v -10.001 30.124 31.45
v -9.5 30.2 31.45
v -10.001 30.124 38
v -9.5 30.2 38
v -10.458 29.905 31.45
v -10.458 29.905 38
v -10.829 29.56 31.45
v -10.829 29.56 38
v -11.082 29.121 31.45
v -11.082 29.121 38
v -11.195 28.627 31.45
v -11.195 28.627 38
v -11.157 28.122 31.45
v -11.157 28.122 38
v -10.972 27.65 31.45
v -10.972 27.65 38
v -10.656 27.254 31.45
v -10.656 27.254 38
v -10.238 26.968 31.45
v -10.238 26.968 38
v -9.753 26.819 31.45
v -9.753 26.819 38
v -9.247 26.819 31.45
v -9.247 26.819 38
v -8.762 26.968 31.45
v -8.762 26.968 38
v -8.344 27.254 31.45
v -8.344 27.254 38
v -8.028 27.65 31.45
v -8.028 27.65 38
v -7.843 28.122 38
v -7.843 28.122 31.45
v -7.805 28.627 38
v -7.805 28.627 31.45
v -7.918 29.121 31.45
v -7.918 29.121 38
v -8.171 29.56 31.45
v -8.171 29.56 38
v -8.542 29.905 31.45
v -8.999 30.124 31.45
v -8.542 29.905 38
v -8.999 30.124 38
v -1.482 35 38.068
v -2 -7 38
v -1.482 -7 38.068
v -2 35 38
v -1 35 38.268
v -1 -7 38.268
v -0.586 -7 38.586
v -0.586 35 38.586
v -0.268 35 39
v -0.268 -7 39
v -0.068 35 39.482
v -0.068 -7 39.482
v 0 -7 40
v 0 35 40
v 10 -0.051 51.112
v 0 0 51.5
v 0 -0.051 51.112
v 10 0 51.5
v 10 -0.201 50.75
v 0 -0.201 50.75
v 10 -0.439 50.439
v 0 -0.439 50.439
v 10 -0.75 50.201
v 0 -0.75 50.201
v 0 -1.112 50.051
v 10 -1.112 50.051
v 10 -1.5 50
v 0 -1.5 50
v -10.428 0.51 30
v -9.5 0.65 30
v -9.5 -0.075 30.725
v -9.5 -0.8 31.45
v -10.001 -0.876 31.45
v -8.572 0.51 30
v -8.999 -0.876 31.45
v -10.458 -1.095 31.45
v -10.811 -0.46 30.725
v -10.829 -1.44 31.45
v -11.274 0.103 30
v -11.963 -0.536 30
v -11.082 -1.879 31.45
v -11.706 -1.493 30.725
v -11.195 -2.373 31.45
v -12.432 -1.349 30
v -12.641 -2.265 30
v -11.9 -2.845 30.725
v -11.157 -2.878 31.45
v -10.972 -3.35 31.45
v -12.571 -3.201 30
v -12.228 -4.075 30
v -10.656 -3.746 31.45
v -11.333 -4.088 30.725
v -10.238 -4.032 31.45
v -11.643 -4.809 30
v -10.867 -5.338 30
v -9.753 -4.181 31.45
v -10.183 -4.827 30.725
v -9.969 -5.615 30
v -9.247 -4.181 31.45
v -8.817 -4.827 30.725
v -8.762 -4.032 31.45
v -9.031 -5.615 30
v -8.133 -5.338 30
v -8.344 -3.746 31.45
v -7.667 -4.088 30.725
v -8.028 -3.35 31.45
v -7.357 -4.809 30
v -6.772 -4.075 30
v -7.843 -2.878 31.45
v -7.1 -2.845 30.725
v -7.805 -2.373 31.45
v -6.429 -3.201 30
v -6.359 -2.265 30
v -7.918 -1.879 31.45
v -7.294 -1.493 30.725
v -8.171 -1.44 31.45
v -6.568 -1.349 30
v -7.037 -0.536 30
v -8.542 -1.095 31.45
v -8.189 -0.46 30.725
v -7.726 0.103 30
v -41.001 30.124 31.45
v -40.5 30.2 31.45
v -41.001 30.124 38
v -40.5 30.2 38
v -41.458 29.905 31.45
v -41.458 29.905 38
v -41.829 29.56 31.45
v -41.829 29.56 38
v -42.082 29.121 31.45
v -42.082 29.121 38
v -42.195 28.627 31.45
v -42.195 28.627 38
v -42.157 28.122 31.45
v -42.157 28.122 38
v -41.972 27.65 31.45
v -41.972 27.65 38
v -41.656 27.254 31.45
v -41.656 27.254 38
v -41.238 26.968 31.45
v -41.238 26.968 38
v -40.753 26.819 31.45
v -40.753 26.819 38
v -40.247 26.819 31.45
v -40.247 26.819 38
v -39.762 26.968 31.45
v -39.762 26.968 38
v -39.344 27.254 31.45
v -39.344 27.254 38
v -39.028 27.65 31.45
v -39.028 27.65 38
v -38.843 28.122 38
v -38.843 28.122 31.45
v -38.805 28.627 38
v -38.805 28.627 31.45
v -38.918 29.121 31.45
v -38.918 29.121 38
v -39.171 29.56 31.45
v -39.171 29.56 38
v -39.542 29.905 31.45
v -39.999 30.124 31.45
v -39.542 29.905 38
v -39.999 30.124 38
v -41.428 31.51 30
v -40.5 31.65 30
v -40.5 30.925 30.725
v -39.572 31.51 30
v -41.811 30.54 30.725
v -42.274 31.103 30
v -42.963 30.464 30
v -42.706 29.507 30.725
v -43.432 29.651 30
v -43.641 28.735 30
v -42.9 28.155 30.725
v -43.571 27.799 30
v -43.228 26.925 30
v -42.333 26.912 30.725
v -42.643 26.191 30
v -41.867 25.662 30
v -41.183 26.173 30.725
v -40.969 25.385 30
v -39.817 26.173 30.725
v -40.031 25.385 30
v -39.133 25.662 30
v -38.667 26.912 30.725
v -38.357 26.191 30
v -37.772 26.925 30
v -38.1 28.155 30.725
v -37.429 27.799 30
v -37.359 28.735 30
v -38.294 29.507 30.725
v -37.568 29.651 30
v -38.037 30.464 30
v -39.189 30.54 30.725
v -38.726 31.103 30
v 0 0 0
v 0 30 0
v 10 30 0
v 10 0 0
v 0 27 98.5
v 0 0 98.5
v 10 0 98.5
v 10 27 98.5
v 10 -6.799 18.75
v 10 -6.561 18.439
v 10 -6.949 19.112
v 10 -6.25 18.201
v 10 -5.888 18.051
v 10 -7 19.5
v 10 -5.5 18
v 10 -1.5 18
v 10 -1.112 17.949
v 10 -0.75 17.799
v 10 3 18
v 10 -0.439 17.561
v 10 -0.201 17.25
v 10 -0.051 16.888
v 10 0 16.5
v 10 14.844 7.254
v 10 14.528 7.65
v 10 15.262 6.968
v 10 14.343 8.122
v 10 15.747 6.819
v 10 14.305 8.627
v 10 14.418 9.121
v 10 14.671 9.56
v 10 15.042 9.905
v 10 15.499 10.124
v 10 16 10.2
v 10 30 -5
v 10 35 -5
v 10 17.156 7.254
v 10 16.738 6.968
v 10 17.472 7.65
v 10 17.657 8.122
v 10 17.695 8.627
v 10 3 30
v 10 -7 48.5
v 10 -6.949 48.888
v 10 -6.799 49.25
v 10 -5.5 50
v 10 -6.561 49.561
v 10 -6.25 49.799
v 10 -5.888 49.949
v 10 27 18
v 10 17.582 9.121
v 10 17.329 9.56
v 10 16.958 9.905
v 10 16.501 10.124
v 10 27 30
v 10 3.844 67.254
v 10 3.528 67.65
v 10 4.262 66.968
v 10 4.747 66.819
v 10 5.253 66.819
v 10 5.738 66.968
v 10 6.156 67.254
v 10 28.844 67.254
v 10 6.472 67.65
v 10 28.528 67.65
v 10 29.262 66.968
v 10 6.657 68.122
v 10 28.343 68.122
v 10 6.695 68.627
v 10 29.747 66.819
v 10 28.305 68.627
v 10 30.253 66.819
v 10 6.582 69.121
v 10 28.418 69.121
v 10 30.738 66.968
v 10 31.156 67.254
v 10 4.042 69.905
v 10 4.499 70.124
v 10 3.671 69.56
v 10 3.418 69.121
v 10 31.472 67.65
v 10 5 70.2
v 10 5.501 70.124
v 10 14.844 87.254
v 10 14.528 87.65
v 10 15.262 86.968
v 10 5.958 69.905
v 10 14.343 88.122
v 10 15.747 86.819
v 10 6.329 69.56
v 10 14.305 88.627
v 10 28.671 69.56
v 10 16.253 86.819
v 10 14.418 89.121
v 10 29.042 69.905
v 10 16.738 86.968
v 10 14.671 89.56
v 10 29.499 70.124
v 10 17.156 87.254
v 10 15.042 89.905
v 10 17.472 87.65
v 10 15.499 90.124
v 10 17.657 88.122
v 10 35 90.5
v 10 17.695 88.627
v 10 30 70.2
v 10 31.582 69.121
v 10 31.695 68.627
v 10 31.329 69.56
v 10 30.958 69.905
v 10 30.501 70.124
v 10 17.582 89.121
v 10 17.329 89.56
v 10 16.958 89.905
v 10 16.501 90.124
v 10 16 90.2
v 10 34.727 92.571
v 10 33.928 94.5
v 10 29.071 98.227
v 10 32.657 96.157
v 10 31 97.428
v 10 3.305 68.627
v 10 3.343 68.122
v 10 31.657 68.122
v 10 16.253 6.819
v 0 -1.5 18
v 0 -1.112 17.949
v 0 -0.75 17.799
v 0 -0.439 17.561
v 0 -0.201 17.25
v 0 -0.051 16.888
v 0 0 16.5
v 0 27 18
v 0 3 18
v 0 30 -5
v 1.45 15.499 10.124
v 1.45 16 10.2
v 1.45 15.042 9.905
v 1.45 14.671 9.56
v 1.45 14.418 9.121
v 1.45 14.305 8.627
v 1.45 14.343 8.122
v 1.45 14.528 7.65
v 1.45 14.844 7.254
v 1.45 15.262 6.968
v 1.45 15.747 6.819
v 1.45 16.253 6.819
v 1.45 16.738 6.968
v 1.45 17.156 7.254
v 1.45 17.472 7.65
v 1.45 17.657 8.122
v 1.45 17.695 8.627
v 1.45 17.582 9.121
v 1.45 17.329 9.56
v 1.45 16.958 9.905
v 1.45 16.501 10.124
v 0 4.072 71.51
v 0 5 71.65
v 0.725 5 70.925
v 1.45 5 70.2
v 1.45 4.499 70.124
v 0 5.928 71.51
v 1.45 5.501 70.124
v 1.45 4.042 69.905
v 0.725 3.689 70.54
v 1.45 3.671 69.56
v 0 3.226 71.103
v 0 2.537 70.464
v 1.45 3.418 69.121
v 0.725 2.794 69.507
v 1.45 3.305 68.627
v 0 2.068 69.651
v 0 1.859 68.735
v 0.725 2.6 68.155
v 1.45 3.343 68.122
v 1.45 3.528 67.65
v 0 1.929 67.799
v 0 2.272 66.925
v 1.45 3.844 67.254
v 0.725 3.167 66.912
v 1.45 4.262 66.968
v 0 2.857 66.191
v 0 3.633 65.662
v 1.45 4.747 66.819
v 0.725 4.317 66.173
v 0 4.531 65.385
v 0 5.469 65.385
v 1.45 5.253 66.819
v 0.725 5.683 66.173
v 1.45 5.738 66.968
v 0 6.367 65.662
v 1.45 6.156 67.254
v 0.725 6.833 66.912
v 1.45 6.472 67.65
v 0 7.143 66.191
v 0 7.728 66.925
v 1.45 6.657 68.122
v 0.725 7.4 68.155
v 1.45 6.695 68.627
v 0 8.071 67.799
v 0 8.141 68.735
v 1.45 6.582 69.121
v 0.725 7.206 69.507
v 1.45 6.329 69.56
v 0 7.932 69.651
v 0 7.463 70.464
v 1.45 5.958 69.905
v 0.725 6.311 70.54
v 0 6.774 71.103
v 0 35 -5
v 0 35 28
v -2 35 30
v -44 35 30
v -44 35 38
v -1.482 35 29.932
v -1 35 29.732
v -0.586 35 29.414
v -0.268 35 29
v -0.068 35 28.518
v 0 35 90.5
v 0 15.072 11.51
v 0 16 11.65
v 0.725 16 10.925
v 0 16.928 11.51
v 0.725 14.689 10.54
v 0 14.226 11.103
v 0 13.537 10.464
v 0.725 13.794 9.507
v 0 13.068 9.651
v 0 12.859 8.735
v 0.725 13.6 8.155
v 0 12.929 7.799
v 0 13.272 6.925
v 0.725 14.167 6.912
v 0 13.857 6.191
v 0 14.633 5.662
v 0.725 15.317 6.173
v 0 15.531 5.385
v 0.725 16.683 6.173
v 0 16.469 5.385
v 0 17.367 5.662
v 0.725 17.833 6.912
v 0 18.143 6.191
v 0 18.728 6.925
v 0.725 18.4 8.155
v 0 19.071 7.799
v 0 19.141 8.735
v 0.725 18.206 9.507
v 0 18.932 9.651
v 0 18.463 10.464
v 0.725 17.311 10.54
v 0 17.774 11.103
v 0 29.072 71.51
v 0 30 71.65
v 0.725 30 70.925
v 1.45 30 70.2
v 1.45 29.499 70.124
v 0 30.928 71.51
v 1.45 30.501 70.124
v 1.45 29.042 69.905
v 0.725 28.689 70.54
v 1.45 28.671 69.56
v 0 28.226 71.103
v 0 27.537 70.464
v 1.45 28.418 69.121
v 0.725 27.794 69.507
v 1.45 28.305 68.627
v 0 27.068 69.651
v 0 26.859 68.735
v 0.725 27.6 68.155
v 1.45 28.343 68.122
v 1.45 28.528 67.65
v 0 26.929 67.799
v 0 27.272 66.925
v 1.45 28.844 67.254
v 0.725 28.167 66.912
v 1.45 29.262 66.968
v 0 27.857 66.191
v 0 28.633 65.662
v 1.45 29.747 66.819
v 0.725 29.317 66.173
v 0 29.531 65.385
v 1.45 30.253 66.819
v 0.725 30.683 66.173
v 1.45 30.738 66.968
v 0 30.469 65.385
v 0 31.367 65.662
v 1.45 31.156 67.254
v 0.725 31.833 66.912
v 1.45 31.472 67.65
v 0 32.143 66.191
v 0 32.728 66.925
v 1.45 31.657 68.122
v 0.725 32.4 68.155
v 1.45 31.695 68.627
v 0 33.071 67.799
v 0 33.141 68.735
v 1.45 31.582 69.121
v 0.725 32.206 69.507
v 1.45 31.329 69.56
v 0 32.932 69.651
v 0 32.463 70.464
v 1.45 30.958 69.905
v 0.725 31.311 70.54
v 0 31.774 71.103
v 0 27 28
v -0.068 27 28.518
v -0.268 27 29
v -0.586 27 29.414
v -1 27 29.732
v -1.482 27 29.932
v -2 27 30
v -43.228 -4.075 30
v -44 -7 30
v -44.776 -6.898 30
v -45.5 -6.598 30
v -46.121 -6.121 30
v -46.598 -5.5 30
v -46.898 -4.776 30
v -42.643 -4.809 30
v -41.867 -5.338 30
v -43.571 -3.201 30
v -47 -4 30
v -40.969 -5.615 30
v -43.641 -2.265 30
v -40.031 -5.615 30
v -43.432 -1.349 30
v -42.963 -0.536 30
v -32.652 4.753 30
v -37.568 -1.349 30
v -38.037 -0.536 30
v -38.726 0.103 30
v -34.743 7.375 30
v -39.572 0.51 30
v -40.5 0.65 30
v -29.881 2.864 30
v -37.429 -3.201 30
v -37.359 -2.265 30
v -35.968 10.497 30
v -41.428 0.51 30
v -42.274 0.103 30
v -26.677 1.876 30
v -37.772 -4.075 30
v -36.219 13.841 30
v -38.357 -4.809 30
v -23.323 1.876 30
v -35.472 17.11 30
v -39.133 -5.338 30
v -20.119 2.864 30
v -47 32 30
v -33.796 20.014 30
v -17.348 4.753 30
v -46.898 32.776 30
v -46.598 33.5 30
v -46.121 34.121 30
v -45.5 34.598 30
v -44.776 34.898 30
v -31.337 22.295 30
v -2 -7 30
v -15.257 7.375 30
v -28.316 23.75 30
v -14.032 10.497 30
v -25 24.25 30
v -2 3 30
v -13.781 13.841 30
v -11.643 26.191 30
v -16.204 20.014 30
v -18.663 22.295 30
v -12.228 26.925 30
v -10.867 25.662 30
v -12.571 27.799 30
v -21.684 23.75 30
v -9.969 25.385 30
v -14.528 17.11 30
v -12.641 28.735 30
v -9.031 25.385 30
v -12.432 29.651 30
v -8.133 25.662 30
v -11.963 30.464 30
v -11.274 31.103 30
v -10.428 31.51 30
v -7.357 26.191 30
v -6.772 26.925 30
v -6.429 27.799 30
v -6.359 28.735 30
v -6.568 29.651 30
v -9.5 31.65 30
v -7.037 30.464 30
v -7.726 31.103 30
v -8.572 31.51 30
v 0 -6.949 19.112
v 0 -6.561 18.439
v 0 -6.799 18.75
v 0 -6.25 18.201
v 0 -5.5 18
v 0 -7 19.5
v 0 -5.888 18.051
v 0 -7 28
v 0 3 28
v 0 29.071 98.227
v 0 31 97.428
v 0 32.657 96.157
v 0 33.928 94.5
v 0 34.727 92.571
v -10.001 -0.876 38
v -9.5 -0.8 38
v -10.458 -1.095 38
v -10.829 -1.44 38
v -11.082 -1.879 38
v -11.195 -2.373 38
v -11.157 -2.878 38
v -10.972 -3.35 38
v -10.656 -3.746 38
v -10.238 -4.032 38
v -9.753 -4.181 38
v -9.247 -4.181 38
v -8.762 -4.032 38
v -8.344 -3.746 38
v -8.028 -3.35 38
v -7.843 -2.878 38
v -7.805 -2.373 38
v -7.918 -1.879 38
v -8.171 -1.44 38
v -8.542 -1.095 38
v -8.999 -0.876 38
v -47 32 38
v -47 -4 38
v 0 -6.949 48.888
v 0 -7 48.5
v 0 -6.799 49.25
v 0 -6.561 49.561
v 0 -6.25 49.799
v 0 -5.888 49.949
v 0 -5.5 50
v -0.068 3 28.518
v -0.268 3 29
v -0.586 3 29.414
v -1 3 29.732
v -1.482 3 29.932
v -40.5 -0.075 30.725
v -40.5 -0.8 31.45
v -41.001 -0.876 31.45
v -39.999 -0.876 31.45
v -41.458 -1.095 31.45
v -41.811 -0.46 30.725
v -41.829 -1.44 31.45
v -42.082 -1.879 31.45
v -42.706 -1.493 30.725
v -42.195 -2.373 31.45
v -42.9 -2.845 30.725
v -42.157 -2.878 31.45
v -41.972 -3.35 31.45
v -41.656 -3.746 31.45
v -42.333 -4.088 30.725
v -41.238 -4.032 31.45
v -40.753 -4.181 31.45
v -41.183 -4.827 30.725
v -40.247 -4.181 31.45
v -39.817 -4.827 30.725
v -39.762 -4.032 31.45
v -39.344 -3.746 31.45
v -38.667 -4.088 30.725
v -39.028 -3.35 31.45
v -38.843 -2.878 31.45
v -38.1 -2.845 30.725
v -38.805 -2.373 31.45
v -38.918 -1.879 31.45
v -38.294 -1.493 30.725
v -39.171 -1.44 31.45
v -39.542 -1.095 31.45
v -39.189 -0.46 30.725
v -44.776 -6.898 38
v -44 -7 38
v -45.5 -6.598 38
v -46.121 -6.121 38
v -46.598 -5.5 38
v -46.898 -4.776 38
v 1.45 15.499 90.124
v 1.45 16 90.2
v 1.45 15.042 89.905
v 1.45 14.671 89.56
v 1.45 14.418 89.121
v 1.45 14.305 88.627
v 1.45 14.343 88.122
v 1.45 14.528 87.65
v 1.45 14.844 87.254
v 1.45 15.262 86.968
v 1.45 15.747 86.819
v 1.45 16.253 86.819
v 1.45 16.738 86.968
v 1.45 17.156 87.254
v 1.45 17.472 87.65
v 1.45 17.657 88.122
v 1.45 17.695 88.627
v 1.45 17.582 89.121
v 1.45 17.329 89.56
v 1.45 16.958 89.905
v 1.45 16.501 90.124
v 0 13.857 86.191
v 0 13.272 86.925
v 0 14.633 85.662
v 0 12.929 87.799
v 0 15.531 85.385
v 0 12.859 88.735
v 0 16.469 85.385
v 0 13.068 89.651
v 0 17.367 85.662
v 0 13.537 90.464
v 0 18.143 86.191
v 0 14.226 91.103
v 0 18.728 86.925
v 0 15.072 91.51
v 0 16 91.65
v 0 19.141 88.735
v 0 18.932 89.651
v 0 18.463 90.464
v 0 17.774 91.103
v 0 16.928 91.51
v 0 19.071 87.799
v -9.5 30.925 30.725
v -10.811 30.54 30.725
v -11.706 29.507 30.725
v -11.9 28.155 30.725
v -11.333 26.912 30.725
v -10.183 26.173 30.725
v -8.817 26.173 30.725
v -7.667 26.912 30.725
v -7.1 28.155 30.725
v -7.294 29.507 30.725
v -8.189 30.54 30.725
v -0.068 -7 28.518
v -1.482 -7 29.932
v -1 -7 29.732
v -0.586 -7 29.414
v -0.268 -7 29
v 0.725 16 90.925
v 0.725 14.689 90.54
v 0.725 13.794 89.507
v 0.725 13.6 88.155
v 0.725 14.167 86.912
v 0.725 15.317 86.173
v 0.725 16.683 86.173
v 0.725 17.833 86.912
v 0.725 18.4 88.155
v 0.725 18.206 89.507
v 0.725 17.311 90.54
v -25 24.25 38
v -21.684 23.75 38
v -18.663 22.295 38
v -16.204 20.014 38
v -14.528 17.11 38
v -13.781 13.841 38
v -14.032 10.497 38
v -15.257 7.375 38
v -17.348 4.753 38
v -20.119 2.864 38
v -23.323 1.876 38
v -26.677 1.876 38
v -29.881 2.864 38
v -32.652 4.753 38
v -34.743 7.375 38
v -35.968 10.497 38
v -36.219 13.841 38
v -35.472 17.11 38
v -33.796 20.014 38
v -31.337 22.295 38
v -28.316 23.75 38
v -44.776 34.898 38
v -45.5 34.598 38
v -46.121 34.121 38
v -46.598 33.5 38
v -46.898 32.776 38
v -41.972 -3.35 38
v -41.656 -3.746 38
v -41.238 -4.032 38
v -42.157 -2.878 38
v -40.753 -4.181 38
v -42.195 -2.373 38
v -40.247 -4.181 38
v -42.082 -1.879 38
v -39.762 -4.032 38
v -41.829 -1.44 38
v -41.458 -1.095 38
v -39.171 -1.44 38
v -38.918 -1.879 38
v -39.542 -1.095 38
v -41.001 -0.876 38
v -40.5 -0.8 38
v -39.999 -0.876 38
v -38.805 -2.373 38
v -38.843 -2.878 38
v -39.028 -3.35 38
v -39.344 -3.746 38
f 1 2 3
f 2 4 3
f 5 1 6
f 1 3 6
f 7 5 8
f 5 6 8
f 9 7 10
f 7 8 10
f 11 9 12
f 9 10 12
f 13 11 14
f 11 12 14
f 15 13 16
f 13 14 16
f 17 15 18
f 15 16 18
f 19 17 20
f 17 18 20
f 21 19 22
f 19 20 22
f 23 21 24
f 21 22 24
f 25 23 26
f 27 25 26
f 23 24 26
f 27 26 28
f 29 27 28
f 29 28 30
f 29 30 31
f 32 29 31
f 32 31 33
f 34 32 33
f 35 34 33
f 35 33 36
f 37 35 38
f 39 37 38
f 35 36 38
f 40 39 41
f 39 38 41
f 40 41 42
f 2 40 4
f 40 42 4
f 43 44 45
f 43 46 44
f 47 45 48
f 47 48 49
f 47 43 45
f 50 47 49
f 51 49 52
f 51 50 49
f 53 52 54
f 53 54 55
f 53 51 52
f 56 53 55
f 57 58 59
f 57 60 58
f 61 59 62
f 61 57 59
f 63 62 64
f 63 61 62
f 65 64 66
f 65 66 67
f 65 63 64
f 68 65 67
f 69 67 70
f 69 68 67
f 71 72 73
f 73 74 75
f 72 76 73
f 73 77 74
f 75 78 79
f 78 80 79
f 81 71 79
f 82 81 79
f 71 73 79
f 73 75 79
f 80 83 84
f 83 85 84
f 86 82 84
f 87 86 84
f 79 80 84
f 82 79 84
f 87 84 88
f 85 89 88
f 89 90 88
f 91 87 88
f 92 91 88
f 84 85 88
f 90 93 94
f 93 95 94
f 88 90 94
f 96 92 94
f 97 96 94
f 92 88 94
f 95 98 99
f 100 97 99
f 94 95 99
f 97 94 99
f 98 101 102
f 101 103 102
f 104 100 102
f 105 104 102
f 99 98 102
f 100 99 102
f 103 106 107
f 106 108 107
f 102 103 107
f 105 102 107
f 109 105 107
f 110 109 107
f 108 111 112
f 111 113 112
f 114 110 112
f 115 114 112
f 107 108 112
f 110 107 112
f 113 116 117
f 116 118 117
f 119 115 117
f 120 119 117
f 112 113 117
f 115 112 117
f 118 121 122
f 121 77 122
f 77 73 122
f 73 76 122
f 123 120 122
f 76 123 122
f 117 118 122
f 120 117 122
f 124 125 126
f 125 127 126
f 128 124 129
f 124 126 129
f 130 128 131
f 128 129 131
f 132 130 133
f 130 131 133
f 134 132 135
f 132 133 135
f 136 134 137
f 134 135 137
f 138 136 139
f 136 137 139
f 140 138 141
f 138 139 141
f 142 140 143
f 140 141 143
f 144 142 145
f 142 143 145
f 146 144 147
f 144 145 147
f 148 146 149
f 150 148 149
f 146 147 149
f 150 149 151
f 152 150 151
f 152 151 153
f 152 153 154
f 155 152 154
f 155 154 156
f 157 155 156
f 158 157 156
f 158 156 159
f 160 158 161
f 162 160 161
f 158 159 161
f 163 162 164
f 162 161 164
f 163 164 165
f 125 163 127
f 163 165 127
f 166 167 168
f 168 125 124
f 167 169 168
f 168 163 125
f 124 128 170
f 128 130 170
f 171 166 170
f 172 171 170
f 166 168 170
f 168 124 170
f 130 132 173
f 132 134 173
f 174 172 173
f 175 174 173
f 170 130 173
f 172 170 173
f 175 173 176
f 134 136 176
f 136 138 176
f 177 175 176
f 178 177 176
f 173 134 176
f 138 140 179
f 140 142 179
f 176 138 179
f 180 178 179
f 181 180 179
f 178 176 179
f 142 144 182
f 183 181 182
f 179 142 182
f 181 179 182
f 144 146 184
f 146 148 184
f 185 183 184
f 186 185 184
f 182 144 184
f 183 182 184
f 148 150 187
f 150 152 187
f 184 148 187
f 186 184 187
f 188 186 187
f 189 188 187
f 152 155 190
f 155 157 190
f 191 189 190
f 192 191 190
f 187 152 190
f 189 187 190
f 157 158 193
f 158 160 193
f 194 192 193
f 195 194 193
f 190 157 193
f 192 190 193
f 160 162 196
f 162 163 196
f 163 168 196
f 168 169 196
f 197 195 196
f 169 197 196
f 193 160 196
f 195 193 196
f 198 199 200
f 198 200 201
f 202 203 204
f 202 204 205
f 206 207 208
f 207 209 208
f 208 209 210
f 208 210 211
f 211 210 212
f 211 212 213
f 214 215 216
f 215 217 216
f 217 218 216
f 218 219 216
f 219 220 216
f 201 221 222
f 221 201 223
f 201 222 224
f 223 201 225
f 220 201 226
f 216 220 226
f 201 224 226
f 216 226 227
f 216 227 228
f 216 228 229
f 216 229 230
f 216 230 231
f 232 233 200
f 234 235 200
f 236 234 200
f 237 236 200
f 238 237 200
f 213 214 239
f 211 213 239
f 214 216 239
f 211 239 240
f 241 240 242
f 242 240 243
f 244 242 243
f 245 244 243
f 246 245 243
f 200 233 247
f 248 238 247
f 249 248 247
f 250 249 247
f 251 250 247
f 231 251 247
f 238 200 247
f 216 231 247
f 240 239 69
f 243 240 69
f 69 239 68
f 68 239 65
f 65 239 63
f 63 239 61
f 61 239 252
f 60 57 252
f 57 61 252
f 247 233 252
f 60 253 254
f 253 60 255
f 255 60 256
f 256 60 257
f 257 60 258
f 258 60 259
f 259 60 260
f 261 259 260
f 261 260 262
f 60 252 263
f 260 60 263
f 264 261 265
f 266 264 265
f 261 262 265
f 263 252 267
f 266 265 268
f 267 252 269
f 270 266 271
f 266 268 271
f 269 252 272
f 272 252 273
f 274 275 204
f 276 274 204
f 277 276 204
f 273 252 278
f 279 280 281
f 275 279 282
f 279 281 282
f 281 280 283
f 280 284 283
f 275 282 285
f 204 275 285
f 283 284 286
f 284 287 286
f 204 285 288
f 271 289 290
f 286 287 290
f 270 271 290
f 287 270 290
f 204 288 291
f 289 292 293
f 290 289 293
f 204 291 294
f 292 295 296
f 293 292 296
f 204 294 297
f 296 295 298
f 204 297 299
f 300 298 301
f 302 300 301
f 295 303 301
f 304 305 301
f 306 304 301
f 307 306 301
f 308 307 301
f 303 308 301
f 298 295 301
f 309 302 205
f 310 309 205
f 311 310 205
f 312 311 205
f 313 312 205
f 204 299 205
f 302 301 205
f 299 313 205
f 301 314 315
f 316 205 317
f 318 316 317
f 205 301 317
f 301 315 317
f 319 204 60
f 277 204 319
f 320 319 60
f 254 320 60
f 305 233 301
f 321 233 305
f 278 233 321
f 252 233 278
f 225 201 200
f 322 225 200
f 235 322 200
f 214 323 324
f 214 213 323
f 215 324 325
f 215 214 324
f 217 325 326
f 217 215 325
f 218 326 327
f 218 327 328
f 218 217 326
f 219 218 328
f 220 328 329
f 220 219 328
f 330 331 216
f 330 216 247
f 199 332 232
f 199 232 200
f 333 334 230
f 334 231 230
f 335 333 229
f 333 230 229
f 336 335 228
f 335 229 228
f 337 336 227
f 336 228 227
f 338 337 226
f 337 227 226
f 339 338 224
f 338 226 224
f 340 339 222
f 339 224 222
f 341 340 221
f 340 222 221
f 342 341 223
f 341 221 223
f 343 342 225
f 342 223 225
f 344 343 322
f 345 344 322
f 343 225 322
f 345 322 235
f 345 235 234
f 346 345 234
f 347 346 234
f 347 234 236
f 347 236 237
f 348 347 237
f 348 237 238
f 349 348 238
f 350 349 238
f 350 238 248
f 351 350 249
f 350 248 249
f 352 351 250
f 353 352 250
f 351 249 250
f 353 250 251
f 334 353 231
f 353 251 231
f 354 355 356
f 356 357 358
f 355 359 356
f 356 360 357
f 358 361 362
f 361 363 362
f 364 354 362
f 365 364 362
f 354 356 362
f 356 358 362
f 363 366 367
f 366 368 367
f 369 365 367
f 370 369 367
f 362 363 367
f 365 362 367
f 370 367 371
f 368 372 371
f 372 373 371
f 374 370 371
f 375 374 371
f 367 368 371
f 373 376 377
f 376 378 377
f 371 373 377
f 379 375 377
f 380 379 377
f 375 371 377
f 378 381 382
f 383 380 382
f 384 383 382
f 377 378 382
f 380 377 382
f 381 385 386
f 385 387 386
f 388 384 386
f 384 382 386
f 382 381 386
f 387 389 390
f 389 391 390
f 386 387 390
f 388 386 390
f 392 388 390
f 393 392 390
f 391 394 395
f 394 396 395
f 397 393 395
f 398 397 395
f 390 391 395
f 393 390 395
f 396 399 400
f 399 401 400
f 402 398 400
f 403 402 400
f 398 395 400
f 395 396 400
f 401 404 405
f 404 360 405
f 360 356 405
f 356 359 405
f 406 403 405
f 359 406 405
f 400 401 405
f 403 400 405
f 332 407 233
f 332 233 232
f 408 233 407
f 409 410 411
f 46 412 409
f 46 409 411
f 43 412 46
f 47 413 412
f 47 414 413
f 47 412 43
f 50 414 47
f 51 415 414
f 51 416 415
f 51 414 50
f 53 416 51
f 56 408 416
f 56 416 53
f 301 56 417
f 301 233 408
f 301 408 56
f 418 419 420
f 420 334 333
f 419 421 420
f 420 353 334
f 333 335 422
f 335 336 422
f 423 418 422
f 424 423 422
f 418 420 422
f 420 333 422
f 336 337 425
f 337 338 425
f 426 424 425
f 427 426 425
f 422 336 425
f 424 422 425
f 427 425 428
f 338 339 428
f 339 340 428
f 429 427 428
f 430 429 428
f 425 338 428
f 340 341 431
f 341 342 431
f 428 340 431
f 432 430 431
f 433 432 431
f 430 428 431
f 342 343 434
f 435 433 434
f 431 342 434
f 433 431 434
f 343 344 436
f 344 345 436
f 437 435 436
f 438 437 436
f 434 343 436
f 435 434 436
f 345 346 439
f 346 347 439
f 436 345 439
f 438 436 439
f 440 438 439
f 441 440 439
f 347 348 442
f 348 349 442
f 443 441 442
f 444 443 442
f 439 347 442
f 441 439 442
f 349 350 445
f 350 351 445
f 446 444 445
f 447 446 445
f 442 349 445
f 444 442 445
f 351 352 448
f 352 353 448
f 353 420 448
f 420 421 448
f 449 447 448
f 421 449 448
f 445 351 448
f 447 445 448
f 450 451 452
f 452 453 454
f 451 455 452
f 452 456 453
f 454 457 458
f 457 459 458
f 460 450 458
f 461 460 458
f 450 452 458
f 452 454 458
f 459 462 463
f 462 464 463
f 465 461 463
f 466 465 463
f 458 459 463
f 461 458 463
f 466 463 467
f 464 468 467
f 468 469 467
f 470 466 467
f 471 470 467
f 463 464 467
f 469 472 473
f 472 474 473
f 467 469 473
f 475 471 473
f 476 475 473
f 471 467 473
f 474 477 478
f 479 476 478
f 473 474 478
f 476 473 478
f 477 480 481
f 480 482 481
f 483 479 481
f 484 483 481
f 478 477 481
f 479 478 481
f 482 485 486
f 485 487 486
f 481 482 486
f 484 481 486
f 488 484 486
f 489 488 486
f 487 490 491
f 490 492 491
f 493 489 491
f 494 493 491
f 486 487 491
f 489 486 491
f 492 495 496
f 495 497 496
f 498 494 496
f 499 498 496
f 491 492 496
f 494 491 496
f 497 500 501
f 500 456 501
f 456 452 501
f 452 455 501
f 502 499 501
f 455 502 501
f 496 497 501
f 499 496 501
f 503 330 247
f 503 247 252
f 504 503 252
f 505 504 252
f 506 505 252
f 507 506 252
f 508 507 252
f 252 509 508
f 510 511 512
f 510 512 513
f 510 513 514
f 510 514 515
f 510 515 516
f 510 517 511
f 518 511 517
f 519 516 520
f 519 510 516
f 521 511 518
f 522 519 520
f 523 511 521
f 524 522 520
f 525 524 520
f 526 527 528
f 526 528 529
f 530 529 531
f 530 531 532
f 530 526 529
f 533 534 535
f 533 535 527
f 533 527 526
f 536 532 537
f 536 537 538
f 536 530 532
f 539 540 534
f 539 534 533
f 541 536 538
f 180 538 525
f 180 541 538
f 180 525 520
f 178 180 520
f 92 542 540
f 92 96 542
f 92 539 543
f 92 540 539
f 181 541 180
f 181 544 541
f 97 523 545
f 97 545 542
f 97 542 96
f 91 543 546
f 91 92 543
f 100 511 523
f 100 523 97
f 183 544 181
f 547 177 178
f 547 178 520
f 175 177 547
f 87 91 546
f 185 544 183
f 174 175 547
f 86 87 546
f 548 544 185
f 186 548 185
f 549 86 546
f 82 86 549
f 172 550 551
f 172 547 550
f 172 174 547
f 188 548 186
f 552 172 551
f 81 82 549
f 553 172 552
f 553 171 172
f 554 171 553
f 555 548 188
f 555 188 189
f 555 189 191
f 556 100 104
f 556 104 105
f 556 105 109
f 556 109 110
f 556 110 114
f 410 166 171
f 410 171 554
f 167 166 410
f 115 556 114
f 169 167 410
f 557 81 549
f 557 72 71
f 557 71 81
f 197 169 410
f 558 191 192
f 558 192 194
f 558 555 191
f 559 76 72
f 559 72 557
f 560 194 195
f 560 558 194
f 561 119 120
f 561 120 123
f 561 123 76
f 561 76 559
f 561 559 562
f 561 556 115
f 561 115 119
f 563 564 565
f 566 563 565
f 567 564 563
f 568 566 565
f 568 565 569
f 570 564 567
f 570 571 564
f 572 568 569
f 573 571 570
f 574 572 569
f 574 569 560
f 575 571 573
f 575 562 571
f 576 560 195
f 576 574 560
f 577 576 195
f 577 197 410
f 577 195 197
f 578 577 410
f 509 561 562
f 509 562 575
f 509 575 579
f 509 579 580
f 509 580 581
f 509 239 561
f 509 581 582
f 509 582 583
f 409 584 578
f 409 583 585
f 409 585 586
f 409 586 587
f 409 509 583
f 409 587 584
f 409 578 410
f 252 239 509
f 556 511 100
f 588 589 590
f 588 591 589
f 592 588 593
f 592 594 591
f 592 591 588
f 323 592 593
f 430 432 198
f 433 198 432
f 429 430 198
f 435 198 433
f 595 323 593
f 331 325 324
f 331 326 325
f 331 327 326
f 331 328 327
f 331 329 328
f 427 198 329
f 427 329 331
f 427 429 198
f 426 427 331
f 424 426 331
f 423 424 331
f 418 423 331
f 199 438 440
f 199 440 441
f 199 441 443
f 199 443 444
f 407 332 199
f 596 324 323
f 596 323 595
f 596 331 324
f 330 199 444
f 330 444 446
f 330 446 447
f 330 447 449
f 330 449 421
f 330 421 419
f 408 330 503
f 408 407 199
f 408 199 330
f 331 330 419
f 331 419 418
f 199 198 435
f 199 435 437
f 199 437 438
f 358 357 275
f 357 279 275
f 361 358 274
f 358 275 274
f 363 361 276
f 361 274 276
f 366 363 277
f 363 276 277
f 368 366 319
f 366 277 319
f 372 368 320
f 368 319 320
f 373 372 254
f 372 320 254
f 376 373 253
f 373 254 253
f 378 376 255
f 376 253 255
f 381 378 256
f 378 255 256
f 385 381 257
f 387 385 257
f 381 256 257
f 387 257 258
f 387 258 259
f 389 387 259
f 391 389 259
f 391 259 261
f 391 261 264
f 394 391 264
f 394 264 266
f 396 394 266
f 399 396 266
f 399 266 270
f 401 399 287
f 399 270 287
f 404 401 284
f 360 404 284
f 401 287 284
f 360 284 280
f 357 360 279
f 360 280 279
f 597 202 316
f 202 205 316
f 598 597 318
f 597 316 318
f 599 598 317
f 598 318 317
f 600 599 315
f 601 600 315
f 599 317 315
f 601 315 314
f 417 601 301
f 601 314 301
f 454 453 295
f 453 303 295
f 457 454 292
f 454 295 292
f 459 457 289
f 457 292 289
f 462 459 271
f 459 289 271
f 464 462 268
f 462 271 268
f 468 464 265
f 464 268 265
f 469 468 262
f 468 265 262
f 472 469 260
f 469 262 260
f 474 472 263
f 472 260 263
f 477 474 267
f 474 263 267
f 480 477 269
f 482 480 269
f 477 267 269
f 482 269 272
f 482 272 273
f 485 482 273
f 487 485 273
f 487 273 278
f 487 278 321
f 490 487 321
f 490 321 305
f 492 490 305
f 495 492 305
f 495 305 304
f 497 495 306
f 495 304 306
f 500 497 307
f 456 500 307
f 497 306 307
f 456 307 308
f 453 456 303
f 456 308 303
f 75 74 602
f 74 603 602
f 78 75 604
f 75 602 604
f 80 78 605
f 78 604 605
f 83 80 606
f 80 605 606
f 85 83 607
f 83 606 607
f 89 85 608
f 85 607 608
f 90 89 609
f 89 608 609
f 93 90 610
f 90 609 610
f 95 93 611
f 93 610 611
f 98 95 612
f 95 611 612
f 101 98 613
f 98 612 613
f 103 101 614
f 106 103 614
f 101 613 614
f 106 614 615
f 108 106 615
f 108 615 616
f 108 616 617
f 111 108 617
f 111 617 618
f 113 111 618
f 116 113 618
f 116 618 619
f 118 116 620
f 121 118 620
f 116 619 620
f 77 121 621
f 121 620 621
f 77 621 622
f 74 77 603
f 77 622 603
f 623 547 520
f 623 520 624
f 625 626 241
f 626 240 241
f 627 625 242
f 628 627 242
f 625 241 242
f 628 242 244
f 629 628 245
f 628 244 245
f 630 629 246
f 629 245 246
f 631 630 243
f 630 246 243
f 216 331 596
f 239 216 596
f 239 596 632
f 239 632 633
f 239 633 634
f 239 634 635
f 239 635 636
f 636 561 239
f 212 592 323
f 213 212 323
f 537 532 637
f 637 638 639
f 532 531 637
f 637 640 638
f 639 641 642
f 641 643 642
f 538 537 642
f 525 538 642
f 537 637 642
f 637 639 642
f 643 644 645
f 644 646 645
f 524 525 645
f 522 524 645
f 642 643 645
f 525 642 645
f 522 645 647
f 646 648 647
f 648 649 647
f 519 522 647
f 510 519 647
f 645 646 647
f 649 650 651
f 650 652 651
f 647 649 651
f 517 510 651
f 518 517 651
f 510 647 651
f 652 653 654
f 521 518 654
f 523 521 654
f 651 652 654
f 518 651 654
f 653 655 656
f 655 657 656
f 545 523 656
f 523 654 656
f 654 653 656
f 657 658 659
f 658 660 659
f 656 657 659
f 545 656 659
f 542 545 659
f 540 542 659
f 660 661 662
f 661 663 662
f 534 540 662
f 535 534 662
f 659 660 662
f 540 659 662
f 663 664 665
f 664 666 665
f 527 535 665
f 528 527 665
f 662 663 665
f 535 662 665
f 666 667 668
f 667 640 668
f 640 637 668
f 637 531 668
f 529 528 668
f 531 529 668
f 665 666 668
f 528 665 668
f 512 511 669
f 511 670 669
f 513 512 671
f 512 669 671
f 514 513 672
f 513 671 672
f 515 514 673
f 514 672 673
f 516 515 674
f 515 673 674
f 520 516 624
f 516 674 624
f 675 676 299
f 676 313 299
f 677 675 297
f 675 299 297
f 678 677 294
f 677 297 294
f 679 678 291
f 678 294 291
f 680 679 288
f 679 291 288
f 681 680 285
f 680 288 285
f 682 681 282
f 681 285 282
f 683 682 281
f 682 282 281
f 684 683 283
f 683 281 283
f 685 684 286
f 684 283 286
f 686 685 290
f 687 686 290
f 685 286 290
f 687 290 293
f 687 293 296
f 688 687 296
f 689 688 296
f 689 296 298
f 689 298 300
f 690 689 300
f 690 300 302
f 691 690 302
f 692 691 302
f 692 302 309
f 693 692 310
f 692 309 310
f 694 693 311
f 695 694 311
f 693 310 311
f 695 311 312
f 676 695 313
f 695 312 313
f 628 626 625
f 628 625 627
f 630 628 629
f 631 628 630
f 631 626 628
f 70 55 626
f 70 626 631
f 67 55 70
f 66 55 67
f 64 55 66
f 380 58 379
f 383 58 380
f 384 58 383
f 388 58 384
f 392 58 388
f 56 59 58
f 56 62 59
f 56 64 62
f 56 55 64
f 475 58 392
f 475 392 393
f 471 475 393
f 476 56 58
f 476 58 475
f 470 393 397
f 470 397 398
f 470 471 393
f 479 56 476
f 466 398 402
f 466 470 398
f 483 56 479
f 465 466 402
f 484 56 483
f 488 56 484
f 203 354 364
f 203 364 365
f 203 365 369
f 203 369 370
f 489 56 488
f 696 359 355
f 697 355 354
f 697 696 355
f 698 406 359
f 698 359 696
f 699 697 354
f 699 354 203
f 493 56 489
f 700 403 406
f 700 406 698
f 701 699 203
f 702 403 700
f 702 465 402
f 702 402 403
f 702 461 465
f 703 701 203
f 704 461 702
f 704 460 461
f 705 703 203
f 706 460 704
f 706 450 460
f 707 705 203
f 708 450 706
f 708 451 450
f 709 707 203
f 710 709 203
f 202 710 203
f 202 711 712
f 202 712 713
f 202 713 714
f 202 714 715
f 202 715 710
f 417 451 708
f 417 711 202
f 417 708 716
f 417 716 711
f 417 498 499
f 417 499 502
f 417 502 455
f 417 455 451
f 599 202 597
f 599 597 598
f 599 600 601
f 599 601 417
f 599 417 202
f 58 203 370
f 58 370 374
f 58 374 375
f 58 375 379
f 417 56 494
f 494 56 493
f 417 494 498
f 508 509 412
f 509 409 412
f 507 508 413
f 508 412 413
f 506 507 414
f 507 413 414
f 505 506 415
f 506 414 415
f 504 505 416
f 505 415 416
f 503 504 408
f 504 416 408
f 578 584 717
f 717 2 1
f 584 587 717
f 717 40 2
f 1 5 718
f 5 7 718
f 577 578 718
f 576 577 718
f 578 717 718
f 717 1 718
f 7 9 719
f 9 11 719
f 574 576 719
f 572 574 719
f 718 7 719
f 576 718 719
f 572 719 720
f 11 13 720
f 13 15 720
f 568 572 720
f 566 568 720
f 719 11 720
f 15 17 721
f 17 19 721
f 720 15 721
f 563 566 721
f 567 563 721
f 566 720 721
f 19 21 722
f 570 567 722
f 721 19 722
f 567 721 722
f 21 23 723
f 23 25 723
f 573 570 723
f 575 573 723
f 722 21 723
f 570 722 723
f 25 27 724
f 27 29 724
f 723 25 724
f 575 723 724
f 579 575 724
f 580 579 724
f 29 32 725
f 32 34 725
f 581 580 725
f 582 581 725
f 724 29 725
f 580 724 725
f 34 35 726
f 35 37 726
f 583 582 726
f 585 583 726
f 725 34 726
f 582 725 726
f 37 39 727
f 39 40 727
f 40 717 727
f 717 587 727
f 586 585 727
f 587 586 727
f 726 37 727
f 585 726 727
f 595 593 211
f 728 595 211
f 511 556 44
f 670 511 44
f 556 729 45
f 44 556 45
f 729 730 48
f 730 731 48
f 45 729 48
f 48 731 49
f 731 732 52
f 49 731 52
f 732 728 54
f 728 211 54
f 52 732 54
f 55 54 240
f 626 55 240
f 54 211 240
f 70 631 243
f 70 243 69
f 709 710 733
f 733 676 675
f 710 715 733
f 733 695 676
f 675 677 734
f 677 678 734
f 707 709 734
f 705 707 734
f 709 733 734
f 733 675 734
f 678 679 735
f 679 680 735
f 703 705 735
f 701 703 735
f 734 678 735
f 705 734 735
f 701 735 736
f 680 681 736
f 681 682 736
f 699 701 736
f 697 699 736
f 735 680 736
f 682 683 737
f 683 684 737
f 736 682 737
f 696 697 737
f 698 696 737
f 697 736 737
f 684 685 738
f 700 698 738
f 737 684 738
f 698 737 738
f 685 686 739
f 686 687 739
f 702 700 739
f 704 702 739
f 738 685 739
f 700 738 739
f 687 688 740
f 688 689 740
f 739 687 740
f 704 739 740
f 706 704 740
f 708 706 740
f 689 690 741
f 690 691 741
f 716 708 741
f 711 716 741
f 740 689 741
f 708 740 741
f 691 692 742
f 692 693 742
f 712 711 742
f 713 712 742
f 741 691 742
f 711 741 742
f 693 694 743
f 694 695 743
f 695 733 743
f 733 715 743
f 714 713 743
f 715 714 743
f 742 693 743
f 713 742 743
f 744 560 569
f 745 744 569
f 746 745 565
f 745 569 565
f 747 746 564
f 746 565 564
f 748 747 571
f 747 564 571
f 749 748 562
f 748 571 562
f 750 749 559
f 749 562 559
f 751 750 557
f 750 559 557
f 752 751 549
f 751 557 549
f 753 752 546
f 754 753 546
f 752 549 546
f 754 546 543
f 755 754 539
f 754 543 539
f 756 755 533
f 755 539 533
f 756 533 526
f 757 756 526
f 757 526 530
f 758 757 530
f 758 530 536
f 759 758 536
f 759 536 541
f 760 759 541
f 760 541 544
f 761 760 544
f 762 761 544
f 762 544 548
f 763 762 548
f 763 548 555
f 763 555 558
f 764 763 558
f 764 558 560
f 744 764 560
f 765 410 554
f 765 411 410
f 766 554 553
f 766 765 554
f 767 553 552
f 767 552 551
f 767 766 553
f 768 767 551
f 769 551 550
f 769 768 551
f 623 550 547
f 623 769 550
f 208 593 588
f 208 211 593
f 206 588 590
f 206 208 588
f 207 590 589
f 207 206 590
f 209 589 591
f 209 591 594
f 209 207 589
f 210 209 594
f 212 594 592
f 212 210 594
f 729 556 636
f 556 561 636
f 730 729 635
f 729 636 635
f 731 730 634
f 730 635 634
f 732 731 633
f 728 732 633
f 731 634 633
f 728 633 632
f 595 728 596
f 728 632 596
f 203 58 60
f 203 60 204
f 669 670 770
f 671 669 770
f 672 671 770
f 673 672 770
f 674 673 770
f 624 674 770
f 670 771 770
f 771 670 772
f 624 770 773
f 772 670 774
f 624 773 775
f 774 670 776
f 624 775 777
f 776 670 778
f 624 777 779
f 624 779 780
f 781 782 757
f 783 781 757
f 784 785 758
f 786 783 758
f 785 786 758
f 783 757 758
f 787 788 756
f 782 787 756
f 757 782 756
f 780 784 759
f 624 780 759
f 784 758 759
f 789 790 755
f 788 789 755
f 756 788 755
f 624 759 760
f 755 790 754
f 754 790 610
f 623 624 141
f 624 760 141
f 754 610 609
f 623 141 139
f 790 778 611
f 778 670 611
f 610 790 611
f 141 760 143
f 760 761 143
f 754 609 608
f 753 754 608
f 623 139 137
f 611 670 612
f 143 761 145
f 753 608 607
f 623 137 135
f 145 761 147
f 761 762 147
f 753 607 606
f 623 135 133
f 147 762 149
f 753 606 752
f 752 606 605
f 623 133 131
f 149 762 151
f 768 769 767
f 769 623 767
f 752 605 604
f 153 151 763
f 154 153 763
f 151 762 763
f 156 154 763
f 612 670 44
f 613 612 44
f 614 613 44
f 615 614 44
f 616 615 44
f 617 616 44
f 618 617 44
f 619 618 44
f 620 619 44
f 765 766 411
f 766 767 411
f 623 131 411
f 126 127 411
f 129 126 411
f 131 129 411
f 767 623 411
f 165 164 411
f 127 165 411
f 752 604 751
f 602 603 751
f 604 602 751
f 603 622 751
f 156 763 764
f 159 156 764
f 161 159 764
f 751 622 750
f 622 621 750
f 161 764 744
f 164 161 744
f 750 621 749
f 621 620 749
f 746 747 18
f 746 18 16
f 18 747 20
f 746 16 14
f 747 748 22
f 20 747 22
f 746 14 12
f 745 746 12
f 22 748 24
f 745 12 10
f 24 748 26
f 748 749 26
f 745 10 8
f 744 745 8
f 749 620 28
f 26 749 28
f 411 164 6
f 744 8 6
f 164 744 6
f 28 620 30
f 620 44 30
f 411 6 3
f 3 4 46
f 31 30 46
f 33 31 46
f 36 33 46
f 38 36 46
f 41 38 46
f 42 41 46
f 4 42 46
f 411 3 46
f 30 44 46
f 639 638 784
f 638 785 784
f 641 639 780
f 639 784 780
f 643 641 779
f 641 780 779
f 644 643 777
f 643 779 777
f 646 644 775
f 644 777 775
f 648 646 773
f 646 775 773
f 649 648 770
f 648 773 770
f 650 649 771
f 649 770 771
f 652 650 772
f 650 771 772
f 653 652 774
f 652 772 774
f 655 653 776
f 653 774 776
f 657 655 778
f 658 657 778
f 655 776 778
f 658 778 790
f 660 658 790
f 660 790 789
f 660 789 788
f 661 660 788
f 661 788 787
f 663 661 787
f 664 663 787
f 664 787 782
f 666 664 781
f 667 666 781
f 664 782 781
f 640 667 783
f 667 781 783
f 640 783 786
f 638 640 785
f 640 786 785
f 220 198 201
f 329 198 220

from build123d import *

# Parameters (mm, degrees)
BOSS_EXTRUDE1_DEPTH                                 = 10
CSK_FOR_M3_COUNTERSUNK_FLAT_HEAD_SCREW1_D           = 3.4
CSK_FOR_M3_COUNTERSUNK_FLAT_HEAD_SCREW1_CSINK_D     = 6.3
CSK_FOR_M3_COUNTERSUNK_FLAT_HEAD_SCREW1_CSINK_ANGLE = 90
SKETCH4_W                                           = 12
SKETCH4_H                                           = 24
CUT_EXTRUDE1_DEPTH                                  = 10
SKETCH6_W                                           = 32
SKETCH6_H                                           = 7
BOSS_EXTRUDE3_DEPTH                                 = 10
SKETCH7_W                                           = 8
SKETCH7_H                                           = 42
BOSS_EXTRUDE4_DEPTH                                 = 47
SKETCH8_R                                           = 11.25
CUT_EXTRUDE2_DEPTH                                  = 47
CSK_FOR_M3_COUNTERSUNK_FLAT_HEAD_SCREW2_D           = 3.4
CSK_FOR_M3_COUNTERSUNK_FLAT_HEAD_SCREW2_CSINK_D     = 6.3
CSK_FOR_M3_COUNTERSUNK_FLAT_HEAD_SCREW2_CSINK_ANGLE = 90
FILLET1_R                                           = 8
FILLET2_R                                           = 1.5
FILLET3_R                                           = 3
FILLET4_R                                           = 2


with BuildPart() as part:
    # Sketch1 → Boss-Extrude1 (new body)
    with BuildSketch(Plane(origin=(0, 0, 0), x_dir=(0, 0, -1), z_dir=(1, 0, 0))):
        Polygon((0, 0), (-98.5, 0), (-98.5, 35), (0, 35), (5, 35), (5, 30), (0, 30), align=None)
    extrude(amount=BOSS_EXTRUDE1_DEPTH)

    # CSK for M3 Countersunk Flat Head Screw1 (through all)
    with Locations(Plane(origin=(0, 16, 8.5), x_dir=(0, 0, -1), z_dir=(-1, 0, 0))):
        with Locations((0, 0), (-60, -14), (-60, 11), (-80, 0)):
            CounterSinkHole(CSK_FOR_M3_COUNTERSUNK_FLAT_HEAD_SCREW1_D / 2, CSK_FOR_M3_COUNTERSUNK_FLAT_HEAD_SCREW1_CSINK_D / 2, counter_sink_angle=CSK_FOR_M3_COUNTERSUNK_FLAT_HEAD_SCREW1_CSINK_ANGLE)

    # Sketch4 → Cut-Extrude1 (cut)
    with BuildSketch(Plane.ZY):
        with Locations((24, 15)):
            Rectangle(SKETCH4_W, SKETCH4_H)
    extrude(amount=-CUT_EXTRUDE1_DEPTH, mode=Mode.SUBTRACT)

    # Sketch6 → Boss-Extrude3 (add)
    with BuildSketch(Plane.ZY):
        with Locations((34, -3.5)):
            Rectangle(SKETCH6_W, SKETCH6_H)
    extrude(amount=-BOSS_EXTRUDE3_DEPTH)

    # Sketch7 → Boss-Extrude4 (add)
    with BuildSketch(Plane.ZY):
        with Locations((34, 14)):
            Rectangle(SKETCH7_W, SKETCH7_H)
    extrude(amount=BOSS_EXTRUDE4_DEPTH)

    # Sketch8 → Cut-Extrude2 (cut)
    with BuildSketch(Plane(origin=(0, 0, 30), x_dir=(-1, 0, 0), z_dir=(0, 0, -1))):
        with Locations(Location((25, 13, 0), (0, 0, 90))):
            Circle(SKETCH8_R)
    extrude(amount=-CUT_EXTRUDE2_DEPTH, mode=Mode.SUBTRACT)

    # CSK for M3 Countersunk Flat Head Screw2 (through all)
    with Locations(Plane(origin=(-9.5, 28.5, 30), x_dir=(0, -1, 0), z_dir=(0, 0, -1))):
        with Locations((0, 0), (0, 31), (31, 31), (31, 0)):
            CounterSinkHole(CSK_FOR_M3_COUNTERSUNK_FLAT_HEAD_SCREW2_D / 2, CSK_FOR_M3_COUNTERSUNK_FLAT_HEAD_SCREW2_CSINK_D / 2, counter_sink_angle=CSK_FOR_M3_COUNTERSUNK_FLAT_HEAD_SCREW2_CSINK_ANGLE)

    # Fillet1
    fillet1_edges = [part.edges().sort_by_distance(p)[0] for p in [
        (5, 35, 98.5),
    ]]
    fillet(fillet1_edges, radius=FILLET1_R)

    # Fillet2
    fillet2_edges = [part.edges().sort_by_distance(p)[0] for p in [
        (5, -7, 18),
        (5, 0, 18),
        (5, 0, 50),
        (5, -7, 50),
    ]]
    fillet(fillet2_edges, radius=FILLET2_R)

    # Fillet3
    fillet3_edges = [part.edges().sort_by_distance(p)[0] for p in [
        (-47, -7, 34),
        (-47, 35, 34),
    ]]
    fillet(fillet3_edges, radius=FILLET3_R)

    # Fillet4
    fillet4_edges = [part.edges().sort_by_distance(p)[0] for p in [
        (0, -2, 30),
        (0, 31, 30),
        (0, 14, 38),
    ]]
    fillet(fillet4_edges, radius=FILLET4_R)


solid = part.part
